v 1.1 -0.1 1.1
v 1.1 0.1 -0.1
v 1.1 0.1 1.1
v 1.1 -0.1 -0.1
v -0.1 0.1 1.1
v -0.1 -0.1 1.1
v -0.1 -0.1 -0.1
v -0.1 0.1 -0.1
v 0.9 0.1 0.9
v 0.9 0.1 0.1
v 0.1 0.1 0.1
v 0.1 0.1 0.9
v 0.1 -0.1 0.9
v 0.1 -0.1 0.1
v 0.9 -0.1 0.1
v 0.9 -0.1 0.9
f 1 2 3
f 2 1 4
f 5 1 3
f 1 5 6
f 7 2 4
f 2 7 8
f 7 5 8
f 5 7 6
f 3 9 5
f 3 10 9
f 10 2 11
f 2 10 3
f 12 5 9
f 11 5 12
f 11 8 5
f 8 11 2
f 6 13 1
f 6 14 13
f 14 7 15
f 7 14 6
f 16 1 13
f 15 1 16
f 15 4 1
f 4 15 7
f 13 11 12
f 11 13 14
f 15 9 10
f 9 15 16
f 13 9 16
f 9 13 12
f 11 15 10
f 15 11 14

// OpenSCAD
color([0.3, 0.3, 0.5])
difference() {
    translate([-0.1,-0.1,-0.1])
    cube([1.2, .2, 1.2], false);

    rotate([90, 0, 0])
    {
        translate([.5, .5, 0])
        cube([.8, .8, .3], center = true);
    }

}
